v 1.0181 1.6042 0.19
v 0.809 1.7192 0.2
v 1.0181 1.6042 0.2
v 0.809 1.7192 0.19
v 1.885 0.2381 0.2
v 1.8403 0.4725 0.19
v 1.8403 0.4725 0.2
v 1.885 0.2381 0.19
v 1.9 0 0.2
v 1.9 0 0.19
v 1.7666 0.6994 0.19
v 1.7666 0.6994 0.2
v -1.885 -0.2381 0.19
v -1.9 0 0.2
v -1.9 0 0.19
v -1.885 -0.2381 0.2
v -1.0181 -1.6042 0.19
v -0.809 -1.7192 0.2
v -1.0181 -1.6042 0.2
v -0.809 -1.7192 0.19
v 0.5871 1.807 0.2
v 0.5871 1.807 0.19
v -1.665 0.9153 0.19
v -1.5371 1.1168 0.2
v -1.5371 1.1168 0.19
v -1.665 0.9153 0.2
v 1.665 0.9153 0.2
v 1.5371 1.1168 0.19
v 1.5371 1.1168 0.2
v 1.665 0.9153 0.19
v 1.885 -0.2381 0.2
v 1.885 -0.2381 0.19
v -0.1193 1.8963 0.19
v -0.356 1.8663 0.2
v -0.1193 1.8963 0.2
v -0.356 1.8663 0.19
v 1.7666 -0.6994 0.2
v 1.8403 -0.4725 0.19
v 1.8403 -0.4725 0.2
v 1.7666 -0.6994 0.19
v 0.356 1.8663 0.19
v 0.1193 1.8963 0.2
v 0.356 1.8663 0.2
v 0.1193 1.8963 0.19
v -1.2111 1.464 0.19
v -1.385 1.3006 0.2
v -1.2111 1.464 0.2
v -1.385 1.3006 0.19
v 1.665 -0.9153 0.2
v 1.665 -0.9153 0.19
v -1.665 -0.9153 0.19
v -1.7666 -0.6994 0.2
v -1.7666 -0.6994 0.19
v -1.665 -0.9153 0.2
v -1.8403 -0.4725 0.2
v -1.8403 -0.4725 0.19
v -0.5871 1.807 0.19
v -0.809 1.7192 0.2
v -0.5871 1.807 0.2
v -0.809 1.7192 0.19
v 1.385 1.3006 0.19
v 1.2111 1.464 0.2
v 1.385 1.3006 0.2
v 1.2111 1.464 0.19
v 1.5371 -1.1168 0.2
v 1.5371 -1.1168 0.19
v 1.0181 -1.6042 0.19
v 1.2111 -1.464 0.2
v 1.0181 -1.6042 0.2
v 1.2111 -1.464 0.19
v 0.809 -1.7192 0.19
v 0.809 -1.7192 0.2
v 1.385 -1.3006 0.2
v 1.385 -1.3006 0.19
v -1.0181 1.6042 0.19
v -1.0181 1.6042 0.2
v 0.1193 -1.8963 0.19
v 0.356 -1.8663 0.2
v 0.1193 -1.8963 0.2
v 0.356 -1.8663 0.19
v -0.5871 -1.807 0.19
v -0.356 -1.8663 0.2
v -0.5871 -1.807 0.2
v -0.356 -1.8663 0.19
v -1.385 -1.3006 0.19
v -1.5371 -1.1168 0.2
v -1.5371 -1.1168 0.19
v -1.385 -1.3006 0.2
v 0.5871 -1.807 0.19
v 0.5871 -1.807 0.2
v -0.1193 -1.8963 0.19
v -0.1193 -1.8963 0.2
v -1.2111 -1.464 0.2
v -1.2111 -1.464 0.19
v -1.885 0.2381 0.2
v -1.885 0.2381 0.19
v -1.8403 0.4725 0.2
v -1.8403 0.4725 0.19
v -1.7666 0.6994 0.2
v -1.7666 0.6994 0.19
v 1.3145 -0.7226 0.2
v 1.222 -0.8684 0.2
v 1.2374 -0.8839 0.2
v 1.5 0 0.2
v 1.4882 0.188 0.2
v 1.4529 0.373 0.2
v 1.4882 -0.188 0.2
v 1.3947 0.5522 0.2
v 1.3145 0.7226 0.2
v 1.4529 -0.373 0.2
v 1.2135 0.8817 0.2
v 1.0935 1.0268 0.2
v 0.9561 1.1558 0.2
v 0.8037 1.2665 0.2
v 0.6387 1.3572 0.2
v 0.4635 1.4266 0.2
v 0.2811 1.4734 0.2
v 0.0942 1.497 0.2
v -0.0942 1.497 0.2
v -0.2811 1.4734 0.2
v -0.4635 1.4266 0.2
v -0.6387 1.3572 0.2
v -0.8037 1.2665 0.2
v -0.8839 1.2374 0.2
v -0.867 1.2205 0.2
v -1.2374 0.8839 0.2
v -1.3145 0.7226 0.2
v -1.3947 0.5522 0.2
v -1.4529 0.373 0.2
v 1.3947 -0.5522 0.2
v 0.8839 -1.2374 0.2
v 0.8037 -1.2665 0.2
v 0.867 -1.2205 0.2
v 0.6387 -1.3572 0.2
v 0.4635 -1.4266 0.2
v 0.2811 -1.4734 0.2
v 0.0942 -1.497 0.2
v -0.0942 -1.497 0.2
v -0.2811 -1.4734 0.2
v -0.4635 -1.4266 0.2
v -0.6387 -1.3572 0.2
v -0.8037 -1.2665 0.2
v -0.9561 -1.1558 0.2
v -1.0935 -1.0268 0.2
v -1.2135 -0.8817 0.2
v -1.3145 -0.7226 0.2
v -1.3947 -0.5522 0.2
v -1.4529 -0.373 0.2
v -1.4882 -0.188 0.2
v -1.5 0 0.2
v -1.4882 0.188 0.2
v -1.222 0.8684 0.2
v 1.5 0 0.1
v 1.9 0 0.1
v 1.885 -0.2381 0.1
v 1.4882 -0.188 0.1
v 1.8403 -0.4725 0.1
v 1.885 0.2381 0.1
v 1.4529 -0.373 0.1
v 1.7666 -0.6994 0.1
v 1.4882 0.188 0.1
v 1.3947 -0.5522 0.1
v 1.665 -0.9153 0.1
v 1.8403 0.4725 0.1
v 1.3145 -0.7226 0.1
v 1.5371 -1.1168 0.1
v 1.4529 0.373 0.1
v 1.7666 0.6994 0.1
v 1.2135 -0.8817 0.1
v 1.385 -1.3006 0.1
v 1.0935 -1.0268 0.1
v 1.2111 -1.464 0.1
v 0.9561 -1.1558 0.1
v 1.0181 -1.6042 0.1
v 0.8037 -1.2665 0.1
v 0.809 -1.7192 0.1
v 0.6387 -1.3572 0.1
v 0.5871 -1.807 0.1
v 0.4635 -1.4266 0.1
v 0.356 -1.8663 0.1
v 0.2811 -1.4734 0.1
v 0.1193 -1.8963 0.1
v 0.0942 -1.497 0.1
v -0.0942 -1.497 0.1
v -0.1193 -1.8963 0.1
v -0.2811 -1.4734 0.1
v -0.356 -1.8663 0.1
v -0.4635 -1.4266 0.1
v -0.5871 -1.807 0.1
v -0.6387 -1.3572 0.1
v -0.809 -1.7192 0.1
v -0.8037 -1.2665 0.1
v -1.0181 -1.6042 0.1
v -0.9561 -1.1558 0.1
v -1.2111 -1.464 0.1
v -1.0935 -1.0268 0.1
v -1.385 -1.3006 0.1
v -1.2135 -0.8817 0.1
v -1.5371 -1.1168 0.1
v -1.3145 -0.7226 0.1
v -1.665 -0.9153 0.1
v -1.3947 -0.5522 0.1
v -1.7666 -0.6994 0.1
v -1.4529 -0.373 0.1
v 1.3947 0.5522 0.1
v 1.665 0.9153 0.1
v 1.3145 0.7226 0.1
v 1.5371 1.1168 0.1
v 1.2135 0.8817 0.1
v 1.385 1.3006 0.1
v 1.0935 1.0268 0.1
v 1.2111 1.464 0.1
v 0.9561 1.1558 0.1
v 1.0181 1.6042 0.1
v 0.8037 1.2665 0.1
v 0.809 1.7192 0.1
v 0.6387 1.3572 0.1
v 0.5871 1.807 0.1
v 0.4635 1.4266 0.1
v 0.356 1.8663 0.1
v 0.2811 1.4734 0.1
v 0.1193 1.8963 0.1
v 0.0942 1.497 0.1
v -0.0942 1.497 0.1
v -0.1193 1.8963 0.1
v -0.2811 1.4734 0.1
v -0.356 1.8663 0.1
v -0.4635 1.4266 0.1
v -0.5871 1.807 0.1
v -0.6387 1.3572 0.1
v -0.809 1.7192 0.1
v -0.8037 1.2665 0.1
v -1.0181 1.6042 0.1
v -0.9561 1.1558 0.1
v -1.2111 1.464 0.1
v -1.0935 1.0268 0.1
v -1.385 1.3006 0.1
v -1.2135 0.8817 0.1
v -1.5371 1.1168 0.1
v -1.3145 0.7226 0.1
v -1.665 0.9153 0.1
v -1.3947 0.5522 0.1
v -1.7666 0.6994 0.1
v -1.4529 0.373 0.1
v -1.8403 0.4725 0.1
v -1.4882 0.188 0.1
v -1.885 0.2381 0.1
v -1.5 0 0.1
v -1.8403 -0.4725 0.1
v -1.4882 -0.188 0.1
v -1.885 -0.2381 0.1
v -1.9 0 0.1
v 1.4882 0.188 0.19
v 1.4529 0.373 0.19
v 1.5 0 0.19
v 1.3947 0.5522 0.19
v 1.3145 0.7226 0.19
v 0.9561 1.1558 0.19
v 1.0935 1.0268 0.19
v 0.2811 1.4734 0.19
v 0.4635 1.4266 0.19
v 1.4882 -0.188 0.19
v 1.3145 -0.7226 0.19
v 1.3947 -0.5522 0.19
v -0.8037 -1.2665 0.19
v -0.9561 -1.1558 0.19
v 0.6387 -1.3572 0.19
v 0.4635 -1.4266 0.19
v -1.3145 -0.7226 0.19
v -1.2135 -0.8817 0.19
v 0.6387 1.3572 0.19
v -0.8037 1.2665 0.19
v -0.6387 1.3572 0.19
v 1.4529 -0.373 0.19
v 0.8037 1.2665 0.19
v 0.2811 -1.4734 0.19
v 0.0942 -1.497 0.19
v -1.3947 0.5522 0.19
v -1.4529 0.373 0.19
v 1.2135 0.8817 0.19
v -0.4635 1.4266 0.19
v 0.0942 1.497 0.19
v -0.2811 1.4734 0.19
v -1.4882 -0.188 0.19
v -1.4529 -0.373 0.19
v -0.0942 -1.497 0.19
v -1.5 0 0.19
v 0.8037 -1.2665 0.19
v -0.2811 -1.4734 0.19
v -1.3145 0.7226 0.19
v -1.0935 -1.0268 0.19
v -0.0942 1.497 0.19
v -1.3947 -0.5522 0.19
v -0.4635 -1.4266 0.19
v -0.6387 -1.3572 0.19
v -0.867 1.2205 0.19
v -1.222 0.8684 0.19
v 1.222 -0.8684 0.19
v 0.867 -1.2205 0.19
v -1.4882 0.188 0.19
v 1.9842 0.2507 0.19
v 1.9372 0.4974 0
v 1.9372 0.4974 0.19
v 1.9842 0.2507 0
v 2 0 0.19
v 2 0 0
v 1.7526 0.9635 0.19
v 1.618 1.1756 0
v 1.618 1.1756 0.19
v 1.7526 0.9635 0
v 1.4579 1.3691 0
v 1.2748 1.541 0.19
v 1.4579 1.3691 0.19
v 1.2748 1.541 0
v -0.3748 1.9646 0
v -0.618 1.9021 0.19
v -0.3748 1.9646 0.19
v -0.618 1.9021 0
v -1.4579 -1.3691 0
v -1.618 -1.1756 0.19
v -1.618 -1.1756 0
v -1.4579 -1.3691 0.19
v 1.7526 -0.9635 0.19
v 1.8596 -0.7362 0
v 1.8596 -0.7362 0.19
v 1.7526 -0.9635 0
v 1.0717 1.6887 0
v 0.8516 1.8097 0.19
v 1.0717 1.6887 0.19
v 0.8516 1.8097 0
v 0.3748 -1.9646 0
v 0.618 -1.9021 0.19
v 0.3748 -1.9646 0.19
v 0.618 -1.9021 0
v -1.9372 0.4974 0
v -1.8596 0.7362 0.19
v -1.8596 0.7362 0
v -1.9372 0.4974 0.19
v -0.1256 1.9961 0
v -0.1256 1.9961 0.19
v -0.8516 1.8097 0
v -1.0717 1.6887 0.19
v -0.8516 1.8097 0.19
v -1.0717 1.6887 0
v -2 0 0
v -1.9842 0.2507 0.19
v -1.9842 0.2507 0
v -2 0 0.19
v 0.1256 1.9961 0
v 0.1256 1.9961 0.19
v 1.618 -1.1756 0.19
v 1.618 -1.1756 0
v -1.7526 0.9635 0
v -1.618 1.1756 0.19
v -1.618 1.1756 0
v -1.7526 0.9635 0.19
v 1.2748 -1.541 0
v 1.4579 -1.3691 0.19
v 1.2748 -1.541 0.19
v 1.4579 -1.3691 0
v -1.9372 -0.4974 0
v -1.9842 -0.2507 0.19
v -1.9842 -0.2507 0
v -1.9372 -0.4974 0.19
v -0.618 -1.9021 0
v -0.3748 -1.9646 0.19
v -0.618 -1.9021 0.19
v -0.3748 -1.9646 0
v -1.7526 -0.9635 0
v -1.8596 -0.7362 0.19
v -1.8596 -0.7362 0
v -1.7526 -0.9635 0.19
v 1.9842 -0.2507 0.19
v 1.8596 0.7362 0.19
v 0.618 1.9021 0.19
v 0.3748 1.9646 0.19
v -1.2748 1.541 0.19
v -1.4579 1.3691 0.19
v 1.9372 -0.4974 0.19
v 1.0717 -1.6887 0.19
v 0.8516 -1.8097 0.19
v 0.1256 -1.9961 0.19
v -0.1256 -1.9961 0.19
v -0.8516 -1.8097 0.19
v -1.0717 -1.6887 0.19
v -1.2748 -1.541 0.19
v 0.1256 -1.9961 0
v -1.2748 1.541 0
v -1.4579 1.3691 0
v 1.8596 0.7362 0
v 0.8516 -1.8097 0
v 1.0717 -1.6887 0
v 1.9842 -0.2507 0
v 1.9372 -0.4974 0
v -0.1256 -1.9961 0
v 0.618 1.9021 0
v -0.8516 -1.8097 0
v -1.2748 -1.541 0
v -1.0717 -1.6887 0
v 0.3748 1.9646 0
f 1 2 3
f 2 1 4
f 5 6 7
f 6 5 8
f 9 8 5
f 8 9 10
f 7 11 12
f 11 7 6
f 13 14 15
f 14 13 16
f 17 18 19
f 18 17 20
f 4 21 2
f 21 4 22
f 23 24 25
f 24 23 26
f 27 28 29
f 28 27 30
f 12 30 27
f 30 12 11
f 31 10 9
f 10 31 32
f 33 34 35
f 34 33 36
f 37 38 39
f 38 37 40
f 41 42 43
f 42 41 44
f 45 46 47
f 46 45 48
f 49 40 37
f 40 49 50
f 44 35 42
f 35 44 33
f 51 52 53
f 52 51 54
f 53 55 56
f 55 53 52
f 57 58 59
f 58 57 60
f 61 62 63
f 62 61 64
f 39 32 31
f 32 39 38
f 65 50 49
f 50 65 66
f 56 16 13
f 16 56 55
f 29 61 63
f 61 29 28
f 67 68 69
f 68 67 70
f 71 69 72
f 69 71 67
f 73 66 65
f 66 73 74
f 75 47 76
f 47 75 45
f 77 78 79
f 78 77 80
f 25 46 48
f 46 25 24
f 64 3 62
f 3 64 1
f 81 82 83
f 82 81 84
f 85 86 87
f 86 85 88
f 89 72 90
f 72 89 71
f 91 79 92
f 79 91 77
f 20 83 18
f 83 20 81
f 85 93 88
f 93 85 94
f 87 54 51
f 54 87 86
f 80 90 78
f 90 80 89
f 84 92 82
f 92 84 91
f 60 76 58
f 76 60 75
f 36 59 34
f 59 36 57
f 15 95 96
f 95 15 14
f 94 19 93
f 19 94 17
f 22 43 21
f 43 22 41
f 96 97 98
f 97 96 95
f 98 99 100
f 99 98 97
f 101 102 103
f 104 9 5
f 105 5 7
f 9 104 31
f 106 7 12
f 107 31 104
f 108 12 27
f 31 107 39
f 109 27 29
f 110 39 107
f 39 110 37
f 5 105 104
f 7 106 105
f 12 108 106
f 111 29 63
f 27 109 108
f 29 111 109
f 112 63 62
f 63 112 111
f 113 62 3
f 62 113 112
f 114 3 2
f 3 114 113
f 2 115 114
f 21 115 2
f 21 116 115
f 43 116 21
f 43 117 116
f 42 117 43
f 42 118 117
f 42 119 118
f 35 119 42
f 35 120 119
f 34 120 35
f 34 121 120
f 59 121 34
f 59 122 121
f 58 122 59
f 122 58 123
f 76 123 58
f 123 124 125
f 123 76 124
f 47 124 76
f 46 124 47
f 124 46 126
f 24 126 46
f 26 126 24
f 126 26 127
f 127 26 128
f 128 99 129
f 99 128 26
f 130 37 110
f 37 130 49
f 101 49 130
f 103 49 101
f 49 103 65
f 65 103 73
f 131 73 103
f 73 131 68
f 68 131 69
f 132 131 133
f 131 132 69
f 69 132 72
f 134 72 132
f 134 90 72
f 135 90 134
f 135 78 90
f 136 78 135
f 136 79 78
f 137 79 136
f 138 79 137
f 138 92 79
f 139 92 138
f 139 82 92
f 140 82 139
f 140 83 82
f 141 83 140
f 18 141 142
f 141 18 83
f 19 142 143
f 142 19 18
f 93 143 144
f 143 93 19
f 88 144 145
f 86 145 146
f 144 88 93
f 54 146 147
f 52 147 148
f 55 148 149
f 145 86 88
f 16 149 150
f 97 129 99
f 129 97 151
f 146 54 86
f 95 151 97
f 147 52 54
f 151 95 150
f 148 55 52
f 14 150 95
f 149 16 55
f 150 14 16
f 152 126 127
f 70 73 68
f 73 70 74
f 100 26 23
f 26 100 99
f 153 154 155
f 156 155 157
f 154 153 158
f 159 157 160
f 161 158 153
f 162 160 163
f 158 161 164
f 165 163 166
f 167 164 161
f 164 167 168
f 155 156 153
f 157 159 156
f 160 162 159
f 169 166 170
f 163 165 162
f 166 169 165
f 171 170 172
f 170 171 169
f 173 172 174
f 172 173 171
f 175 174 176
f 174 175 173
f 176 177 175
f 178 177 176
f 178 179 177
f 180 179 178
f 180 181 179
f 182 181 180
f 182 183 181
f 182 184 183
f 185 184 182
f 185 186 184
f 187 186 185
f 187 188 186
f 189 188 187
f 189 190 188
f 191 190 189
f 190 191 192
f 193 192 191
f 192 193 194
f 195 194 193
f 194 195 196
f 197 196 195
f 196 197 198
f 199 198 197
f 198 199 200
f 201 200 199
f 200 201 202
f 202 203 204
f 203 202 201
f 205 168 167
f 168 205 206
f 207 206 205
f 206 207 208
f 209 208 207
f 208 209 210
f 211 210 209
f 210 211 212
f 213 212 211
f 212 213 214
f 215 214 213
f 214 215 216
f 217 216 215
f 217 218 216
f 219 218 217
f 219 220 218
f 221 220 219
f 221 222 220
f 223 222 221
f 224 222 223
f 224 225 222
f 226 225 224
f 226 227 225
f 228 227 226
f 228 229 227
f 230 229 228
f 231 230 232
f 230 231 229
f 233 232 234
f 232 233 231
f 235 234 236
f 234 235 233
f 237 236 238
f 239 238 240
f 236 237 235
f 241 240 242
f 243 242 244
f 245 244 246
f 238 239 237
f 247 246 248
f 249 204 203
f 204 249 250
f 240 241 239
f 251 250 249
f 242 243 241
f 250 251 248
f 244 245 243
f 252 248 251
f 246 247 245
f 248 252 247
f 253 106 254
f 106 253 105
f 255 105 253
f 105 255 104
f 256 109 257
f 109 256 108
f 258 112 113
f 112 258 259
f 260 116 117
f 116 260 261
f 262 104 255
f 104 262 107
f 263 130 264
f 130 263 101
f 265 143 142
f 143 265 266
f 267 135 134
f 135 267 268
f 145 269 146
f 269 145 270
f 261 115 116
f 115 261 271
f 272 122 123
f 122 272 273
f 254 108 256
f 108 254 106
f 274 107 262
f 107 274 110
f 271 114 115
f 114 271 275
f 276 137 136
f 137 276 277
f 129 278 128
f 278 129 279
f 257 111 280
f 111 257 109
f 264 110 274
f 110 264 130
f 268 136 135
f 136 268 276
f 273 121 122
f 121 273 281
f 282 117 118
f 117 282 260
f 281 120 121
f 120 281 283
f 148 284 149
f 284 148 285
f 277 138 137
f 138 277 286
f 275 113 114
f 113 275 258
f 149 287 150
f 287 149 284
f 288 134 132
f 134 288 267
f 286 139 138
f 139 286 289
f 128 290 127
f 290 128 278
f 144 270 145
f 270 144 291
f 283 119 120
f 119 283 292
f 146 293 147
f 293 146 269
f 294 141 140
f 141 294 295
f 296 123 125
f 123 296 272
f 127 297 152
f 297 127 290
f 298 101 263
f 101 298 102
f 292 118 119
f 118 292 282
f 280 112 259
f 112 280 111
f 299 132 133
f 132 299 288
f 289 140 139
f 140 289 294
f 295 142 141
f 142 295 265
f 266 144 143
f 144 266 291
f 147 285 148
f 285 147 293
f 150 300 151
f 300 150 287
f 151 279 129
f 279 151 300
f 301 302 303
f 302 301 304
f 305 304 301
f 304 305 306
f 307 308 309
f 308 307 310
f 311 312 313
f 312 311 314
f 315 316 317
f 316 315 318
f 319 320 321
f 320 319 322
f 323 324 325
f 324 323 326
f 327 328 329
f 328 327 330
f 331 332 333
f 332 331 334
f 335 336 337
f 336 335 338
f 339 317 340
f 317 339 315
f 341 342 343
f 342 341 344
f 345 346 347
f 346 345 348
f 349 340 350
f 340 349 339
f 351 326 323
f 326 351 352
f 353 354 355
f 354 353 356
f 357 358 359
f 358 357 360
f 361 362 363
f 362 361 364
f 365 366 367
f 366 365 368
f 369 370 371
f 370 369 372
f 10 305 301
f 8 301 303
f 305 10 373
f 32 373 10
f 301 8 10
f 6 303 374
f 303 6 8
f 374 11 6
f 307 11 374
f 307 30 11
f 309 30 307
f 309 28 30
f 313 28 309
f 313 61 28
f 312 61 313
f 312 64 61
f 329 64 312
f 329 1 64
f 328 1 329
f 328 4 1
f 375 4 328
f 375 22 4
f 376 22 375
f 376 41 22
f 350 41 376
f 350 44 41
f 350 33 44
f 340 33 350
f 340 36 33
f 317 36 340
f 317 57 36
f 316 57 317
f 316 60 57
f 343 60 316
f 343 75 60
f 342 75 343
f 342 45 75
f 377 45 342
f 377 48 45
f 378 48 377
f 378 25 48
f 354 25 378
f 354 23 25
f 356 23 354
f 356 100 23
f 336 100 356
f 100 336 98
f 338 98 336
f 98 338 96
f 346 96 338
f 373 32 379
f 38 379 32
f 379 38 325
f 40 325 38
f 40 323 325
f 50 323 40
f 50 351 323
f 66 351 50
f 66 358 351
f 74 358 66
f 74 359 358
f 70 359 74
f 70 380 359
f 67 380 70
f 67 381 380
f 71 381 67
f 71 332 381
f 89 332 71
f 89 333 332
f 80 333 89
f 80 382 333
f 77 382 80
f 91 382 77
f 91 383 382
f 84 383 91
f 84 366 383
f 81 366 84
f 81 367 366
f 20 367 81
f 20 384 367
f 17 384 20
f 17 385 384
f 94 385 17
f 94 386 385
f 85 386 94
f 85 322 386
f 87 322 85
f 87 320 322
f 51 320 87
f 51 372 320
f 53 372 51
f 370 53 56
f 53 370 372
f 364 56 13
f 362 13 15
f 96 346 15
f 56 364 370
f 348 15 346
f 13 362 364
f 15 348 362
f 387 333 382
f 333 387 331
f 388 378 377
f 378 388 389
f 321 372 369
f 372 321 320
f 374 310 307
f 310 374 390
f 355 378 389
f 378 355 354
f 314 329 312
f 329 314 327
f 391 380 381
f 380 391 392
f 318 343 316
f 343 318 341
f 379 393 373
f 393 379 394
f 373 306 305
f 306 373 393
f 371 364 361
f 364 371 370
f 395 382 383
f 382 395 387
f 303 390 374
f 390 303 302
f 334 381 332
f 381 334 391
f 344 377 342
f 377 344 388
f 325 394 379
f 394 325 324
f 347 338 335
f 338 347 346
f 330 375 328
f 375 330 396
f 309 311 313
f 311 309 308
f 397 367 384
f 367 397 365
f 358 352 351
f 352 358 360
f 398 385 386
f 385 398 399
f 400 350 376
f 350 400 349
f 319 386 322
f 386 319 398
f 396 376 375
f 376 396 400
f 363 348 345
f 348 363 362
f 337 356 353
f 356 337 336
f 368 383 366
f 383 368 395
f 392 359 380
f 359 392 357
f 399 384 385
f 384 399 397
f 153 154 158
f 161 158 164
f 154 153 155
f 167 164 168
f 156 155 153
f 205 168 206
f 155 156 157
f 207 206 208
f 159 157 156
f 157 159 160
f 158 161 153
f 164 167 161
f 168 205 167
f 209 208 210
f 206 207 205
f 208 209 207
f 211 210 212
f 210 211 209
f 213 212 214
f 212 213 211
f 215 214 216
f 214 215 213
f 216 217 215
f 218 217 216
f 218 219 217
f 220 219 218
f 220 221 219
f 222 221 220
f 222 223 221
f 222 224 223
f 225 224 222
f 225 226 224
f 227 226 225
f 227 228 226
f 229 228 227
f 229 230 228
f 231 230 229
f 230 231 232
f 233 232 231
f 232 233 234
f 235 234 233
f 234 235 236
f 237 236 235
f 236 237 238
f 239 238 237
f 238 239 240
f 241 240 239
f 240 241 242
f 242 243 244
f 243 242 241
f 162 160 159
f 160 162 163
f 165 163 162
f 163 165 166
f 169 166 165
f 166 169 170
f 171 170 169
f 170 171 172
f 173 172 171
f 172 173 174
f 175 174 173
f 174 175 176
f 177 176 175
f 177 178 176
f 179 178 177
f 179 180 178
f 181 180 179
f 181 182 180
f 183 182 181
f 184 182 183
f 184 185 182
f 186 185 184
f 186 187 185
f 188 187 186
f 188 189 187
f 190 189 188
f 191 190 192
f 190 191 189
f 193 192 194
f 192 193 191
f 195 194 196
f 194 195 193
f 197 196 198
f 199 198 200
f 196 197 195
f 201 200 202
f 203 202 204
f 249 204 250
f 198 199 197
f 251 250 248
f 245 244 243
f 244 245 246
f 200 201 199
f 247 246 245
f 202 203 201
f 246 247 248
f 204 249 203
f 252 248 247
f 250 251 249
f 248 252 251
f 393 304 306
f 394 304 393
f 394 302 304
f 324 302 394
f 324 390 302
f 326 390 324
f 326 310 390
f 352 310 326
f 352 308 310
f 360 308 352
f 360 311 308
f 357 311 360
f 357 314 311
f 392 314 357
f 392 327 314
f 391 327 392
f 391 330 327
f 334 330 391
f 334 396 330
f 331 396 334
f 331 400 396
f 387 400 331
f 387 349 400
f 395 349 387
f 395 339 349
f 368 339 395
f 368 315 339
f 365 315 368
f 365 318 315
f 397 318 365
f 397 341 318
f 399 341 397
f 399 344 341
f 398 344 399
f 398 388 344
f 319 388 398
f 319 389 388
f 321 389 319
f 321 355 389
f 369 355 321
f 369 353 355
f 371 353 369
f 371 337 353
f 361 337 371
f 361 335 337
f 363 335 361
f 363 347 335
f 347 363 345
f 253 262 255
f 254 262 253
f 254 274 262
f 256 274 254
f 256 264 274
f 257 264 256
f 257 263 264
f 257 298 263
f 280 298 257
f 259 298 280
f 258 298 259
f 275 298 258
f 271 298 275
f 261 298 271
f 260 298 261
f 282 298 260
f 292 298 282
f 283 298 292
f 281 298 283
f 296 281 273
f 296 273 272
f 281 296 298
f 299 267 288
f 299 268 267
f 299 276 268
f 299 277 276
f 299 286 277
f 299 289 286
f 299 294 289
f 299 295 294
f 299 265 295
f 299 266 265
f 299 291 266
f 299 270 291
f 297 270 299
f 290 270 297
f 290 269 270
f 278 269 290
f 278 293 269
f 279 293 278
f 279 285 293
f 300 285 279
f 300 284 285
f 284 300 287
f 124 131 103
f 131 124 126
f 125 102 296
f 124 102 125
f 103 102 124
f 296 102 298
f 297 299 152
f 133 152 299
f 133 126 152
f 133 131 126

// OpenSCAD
Red_Size = 1.5;


color("gray")
cylinder(h = 0.1, r1 = 2,r2 = 2,$fn = 50);

translate([0,0,0.1])
difference(){
color("red")
cylinder(h = 0.1, r1 = 1.9,r2 = 1.9,$fn = 50);
cylinder(h = 0.2, r1 = 1.5,r2 = 1.5,$fn = 50);

}


translate([0,0,0.09])
difference(){
color("white")
cylinder(h = 0.1, r1 = 2,r2 = 2,$fn = 50);
cylinder(h = 0.2, r1 = 1.9,r2 = 1.9,$fn = 50);

}

color("white")
translate([0,0,0.09])
cylinder(h = 0.1, r1 = 1.5,r2 = 1.5,$fn = 50);


rotate([0,0,-45])
translate([0,0,0.09])
color("red")
translate([0,0,0.09])
cube([3,0.5,0.04], center = true);
